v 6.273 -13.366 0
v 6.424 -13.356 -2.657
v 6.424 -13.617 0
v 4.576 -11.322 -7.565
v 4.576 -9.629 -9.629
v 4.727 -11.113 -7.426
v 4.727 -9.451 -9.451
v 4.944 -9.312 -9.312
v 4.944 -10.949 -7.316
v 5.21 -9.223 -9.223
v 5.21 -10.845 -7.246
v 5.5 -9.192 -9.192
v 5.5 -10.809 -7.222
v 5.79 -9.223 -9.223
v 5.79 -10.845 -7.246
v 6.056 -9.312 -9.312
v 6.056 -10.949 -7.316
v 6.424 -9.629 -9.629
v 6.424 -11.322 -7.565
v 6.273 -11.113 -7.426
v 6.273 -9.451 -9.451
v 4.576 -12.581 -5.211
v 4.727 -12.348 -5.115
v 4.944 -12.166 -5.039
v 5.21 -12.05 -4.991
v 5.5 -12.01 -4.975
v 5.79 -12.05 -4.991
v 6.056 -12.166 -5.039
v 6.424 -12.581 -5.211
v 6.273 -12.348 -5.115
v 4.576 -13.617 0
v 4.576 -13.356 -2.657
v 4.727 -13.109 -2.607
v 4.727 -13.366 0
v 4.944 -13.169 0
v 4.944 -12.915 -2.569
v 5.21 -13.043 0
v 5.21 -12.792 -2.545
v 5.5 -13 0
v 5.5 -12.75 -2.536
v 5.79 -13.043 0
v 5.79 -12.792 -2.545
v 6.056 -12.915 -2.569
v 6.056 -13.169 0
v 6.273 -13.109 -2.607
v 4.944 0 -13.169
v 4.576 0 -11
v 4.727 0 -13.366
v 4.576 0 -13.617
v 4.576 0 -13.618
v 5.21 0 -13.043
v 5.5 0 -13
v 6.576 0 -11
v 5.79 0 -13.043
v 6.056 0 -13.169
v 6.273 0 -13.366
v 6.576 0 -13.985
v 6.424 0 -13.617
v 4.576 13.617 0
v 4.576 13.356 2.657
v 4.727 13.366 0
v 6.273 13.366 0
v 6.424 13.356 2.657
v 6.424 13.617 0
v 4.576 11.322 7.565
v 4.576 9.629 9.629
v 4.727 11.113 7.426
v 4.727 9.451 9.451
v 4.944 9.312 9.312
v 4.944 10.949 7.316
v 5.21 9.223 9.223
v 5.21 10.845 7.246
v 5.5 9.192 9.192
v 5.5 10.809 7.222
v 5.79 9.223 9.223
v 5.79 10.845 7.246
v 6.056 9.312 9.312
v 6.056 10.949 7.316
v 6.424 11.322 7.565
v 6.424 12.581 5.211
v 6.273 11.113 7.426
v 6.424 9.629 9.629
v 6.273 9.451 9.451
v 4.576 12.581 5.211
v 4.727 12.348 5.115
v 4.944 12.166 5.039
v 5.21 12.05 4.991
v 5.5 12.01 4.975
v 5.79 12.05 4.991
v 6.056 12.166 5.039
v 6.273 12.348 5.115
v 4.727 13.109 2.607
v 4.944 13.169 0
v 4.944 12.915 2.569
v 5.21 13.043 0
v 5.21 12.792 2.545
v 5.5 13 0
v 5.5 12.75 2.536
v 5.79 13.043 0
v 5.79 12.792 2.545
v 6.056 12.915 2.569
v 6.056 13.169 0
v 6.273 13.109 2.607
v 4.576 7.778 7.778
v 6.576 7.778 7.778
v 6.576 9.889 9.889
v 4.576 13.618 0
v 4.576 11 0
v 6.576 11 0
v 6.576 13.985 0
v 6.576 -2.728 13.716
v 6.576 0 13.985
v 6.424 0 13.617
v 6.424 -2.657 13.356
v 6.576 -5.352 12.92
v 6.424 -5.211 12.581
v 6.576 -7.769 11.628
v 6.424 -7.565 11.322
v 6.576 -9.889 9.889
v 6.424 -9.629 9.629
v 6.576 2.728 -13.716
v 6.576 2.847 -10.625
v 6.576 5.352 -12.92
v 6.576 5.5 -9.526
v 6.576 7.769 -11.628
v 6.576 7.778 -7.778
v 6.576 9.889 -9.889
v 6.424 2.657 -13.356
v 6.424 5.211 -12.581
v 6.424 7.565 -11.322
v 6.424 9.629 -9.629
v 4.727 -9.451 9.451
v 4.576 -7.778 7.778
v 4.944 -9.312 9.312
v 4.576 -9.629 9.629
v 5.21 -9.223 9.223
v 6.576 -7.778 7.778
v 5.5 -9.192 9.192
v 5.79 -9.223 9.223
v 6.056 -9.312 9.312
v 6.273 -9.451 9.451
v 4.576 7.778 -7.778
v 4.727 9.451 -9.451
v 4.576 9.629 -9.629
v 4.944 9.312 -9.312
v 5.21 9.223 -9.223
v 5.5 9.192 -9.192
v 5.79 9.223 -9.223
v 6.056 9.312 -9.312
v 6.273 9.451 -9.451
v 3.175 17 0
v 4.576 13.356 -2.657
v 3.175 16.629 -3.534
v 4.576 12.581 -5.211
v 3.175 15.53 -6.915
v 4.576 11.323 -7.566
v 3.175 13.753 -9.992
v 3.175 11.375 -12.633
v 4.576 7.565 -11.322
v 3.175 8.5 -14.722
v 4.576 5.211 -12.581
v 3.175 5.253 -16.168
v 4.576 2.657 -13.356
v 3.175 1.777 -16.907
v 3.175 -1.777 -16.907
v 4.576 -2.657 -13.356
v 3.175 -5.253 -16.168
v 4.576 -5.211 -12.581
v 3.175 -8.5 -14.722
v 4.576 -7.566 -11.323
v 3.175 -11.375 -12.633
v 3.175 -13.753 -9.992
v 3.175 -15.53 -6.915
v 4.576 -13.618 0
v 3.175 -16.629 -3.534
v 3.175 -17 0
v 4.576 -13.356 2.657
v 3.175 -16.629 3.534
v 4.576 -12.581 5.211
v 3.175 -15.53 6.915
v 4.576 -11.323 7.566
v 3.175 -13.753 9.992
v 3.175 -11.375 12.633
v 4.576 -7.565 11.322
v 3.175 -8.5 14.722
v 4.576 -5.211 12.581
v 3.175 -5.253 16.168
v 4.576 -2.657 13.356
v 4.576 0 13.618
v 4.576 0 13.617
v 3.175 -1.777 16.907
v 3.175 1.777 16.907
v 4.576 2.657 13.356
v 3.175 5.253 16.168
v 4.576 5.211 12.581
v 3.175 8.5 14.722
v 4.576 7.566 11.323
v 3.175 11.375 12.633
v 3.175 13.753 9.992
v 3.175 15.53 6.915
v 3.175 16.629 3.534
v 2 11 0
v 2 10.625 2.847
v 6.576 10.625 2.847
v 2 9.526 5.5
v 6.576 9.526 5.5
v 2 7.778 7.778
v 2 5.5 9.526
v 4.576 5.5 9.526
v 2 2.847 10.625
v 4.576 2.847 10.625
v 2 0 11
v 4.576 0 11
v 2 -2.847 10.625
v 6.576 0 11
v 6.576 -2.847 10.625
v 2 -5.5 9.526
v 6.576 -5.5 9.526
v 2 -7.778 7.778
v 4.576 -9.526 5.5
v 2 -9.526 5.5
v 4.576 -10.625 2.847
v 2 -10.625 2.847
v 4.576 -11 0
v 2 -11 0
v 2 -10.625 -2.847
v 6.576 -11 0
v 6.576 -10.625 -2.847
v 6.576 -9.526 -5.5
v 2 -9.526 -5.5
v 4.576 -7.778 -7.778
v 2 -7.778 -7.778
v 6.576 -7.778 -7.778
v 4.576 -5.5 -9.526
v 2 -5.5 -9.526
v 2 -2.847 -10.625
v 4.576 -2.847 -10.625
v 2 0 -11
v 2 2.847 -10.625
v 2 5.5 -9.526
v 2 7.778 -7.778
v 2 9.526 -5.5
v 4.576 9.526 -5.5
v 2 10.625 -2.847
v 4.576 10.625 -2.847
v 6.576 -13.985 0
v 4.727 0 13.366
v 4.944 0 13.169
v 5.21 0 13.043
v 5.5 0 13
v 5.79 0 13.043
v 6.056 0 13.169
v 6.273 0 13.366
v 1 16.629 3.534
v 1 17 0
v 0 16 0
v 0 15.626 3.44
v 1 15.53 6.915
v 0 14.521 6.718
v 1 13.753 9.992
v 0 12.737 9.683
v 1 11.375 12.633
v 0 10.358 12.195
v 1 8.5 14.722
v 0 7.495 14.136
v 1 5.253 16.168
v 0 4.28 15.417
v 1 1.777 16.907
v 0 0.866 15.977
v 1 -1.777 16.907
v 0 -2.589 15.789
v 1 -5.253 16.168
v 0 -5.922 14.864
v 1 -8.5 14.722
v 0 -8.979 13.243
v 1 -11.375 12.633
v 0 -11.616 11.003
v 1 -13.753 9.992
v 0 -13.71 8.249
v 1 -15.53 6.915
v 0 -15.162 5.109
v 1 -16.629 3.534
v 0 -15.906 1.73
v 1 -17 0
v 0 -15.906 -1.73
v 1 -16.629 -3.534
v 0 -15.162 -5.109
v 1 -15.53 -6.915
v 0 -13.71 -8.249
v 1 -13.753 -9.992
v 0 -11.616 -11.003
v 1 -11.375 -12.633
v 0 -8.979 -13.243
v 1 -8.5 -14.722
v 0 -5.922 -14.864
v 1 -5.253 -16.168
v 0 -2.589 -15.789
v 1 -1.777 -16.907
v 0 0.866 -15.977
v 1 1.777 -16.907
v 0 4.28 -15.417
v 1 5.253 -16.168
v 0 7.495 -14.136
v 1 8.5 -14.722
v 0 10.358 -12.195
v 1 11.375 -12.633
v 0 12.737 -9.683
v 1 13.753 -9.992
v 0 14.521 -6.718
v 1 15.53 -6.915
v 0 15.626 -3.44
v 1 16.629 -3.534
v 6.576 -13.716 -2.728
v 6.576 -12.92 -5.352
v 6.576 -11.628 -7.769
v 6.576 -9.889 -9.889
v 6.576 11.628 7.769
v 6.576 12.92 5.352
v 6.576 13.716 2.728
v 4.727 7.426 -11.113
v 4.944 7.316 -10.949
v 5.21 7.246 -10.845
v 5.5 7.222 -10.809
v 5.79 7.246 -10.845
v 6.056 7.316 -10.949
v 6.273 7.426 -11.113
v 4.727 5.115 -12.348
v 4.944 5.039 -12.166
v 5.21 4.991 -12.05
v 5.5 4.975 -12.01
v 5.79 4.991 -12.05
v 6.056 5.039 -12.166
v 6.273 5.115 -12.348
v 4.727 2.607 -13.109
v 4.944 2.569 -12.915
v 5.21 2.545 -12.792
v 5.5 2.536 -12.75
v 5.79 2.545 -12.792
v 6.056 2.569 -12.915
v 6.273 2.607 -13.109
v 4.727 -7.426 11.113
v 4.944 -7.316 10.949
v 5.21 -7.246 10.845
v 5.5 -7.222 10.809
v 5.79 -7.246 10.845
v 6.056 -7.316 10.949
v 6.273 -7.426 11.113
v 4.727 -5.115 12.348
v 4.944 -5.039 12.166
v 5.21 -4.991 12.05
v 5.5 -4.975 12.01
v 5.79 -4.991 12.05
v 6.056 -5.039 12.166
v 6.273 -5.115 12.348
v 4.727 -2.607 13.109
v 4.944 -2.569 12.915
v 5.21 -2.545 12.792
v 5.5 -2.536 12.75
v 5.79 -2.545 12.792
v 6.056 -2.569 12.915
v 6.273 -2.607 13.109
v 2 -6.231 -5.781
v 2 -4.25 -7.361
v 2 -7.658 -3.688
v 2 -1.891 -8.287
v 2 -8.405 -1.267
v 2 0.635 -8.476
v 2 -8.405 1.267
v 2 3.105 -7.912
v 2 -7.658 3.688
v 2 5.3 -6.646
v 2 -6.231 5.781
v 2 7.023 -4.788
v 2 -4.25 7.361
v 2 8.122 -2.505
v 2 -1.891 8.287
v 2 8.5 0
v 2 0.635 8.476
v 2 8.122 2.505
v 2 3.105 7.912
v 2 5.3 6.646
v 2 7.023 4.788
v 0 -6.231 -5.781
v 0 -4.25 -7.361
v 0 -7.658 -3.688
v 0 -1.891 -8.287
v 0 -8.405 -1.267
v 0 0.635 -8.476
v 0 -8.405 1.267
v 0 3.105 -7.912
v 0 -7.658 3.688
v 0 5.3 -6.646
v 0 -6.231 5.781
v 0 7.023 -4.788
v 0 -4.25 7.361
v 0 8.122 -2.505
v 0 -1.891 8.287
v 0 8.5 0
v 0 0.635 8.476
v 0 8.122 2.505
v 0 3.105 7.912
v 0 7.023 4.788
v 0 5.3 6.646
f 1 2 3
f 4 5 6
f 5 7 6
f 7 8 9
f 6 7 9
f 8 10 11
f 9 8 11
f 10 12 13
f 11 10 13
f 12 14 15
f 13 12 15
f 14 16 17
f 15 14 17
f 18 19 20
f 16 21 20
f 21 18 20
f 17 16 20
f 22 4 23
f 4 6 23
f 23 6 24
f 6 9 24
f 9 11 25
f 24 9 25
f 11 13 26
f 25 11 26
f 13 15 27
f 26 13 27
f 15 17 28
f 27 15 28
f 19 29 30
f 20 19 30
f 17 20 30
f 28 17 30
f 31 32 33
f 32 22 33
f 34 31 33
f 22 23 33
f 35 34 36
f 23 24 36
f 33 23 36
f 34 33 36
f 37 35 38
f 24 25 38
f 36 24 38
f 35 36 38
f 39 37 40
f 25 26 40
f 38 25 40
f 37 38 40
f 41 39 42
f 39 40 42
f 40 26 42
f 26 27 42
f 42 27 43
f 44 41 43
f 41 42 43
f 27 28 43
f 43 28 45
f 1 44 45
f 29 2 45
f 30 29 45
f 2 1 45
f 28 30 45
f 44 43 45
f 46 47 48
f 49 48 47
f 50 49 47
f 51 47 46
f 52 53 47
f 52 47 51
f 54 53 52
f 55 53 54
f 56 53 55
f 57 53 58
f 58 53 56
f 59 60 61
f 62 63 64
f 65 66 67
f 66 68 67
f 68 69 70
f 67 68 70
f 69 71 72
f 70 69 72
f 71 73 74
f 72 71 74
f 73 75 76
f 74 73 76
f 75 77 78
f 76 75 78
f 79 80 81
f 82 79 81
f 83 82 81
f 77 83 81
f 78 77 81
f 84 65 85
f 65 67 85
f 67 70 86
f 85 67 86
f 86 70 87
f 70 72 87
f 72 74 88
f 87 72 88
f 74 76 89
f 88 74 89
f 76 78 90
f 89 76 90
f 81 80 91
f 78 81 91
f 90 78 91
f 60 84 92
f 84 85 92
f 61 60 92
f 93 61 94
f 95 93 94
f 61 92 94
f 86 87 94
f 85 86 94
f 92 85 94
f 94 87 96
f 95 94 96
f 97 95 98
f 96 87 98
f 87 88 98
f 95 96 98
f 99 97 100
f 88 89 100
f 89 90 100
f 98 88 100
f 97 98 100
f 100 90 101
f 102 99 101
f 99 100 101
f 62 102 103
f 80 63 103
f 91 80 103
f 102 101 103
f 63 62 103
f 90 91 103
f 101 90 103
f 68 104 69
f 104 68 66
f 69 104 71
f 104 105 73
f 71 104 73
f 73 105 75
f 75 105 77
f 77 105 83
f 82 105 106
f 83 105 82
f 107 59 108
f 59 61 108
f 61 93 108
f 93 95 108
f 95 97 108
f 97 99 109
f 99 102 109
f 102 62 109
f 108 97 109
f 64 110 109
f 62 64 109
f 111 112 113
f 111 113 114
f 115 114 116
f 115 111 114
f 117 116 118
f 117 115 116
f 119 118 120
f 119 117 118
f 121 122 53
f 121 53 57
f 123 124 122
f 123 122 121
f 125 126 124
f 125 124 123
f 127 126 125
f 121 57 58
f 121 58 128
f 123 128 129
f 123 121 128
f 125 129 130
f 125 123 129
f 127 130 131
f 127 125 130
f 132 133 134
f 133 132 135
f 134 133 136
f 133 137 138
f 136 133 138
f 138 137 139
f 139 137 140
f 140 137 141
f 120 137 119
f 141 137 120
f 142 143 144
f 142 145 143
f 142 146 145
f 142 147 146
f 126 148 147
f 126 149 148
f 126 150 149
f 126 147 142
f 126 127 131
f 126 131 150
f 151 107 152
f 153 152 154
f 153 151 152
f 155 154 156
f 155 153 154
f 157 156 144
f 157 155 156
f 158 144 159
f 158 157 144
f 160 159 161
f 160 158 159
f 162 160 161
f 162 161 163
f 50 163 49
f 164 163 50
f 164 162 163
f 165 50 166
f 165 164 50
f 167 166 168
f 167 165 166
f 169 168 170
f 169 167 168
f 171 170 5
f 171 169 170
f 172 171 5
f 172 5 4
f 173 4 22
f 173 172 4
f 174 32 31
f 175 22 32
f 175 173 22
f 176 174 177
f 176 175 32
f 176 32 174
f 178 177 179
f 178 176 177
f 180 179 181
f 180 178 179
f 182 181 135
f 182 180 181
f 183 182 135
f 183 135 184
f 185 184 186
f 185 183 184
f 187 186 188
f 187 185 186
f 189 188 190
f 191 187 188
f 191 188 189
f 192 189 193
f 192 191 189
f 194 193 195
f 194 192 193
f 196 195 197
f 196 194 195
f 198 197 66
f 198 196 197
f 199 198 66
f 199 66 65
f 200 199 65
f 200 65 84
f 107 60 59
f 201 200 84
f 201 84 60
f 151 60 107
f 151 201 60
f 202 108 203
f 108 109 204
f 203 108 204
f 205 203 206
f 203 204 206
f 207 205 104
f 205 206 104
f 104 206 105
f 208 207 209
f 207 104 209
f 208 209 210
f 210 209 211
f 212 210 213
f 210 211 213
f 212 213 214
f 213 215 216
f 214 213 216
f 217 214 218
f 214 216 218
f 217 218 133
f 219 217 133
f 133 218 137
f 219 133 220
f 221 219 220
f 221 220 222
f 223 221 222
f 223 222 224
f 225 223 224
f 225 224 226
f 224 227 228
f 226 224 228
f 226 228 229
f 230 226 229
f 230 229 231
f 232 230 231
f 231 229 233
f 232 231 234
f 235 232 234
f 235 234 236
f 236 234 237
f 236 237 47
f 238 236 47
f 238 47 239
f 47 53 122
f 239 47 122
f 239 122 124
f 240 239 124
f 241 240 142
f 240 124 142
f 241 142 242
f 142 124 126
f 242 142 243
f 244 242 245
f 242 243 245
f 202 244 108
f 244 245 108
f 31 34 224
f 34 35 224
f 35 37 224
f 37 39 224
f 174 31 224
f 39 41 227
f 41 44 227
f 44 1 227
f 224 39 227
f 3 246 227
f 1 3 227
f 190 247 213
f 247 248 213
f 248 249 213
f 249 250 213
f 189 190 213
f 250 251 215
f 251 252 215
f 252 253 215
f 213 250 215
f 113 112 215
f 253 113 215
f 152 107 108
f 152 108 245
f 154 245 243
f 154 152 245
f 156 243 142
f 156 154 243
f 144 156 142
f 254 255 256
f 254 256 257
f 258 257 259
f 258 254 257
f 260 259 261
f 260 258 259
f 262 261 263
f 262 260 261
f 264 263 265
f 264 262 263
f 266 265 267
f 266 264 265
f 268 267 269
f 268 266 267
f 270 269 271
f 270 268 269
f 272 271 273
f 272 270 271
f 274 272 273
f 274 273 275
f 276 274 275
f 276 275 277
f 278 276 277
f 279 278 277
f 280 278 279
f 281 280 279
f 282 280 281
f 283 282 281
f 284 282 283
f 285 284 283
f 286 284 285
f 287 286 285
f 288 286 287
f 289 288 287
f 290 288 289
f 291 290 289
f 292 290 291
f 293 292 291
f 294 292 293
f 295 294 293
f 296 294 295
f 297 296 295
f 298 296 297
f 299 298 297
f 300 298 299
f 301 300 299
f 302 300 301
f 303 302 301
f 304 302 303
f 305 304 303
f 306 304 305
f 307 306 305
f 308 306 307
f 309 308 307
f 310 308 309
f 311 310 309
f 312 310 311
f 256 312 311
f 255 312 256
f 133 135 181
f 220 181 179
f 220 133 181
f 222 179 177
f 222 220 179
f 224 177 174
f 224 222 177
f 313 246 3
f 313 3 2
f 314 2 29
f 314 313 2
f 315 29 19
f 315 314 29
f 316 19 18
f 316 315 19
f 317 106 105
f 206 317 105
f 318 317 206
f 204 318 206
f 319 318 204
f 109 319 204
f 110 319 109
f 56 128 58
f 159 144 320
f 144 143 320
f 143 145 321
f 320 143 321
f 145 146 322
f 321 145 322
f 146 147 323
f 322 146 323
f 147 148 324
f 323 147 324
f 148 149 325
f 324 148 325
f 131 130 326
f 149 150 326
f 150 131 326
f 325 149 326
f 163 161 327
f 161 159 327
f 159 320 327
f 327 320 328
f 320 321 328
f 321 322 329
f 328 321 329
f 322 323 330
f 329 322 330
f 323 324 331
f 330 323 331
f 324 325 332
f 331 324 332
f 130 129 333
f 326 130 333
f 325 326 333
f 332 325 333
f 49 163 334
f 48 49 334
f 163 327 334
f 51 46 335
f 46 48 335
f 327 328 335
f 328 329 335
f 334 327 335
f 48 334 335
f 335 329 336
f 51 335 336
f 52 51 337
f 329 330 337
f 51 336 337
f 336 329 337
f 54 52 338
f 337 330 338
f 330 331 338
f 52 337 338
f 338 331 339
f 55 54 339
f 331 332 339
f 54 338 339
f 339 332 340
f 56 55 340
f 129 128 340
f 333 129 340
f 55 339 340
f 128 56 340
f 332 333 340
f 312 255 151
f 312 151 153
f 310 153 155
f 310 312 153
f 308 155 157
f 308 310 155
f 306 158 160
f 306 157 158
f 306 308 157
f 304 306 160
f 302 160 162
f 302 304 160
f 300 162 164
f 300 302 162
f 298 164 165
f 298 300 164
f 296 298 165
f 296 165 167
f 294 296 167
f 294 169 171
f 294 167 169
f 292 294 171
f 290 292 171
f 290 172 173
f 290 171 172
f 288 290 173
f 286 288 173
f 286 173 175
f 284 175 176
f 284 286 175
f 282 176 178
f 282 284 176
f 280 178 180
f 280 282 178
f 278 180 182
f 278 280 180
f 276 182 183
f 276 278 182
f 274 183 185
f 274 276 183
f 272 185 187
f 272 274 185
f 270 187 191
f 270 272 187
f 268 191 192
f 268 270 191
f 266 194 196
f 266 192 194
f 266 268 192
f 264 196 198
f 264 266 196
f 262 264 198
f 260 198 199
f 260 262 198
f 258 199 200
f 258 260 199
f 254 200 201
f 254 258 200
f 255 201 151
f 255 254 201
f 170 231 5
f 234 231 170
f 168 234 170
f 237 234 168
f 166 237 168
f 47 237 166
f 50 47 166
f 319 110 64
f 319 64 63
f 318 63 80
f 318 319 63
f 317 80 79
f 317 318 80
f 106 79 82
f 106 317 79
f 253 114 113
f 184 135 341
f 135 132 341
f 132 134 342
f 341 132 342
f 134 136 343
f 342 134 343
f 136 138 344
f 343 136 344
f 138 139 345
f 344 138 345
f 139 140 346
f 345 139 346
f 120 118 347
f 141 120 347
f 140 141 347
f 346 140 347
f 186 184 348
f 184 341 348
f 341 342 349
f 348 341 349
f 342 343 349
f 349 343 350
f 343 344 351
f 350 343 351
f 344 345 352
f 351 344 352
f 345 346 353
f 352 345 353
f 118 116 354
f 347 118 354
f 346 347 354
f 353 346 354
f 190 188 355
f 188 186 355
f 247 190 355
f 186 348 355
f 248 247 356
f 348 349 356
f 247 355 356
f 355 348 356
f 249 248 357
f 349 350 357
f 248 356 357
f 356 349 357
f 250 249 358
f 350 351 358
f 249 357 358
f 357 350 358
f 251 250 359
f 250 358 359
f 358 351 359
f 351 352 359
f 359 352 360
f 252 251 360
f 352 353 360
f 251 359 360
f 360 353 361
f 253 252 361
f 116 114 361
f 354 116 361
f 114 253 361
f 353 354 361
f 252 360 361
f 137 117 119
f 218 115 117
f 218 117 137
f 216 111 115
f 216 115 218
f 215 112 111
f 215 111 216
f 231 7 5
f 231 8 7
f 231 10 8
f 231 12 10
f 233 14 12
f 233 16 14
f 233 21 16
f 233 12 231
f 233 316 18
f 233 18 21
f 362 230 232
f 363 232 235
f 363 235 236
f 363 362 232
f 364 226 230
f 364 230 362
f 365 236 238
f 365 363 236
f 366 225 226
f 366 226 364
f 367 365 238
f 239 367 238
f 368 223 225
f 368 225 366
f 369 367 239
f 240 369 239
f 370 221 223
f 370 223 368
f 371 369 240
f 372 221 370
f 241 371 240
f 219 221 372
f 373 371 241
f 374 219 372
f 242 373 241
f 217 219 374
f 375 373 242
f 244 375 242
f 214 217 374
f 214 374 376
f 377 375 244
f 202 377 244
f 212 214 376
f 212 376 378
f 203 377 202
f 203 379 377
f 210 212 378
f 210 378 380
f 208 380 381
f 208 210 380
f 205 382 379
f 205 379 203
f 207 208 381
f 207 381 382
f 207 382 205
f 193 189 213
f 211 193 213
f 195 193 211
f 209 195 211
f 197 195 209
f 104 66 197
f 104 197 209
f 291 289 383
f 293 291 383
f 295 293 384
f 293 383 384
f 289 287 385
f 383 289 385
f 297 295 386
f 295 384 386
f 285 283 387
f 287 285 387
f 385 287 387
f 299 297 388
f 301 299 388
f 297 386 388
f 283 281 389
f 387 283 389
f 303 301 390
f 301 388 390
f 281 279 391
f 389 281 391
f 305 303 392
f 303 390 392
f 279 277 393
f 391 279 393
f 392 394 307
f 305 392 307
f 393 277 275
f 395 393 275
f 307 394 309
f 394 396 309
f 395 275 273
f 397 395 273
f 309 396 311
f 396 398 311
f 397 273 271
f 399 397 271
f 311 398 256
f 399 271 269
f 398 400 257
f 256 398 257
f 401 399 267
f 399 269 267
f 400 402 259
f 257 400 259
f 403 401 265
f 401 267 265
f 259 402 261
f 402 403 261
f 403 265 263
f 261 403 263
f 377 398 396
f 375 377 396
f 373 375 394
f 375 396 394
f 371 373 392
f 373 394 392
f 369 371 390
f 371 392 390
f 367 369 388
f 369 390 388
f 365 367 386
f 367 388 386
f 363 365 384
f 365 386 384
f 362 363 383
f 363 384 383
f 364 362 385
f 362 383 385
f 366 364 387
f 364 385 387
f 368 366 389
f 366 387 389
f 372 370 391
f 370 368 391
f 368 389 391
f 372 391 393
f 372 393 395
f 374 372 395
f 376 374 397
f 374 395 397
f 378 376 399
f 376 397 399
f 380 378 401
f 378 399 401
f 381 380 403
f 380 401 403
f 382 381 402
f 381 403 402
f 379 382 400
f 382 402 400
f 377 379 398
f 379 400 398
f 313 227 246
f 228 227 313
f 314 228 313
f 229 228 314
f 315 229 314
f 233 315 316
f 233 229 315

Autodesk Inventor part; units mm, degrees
ref_plane "YZ Plane" through (0, 0, 0) normal (1, 0, 0) x (0, 1, 0)
ref_plane "XZ Plane" through (0, 0, 0) normal (0, 1, 0) x (-1, 0, 0)
ref_plane "XY Plane" through (0, 0, 0) normal (0, 0, 1) x (1, 0, 0)
sketch "Sketch1" plane through (0, 0, 0) normal (0, 0, 1) x (1, 0, 0)
  line L0 (3.175, 17) -> (4.5761, 13.6173)
  line L1 (6.4239, 13.6173) -> (7.825, 17)
  arc A0 (4.5761, 13.6173) -> (6.4239, 13.6173) centre (5.5, 14) ccw
  line L2 (7.825, 17) -> (9, 17)
  line L3 (3.175, 17) -> (0, 17)
  line L4 (2, 11) -> (9, 11)
  line L5 (9, 17) -> (9, 11)
  line L6 (0, 17) -> (0, 8.5)
  line L7 (2, 11) -> (2, 8.5)
  line L8 (2, 8.5) -> (0, 8.5)
  line L9 (0, 0) -> (2, 0) construction
  point P0 (5.5, 11)
  dimension "d0" = 45
  dimension "d1" = 1
  dimension "d2" = 3
  dimension "d4" = 6
  dimension "d5" = 2
  dimension "d8" = 7
  dimension "d9" = 17
  dimension "d10" = 22
revolve "Revolution1" add sketch "Sketch1" angle 360 about axis through (0, 0, 0) along (1, 0, 0)
sketch "Sketch2" plane through (9, 0, 0) normal (1, 0, 0) x (0, 0, -1)
  circle A0 centre (0, 0) radius 11 projected
  circle A1 centre (0, 0) radius 17 projected
  line L0 (-17, 0) -> (17, 0) construction
  line L1 (-12.0208, -12.0208) -> (12.0208, 12.0208) construction
  line L2 (0, -17) -> (0, 17) construction
  line L3 (12.0208, -12.0208) -> (-12.0208, 12.0208) construction
  line L4 (-17, 0) -> (-11, 0)
  line L5 (-7.7782, 7.7782) -> (-12.0208, 12.0208)
  line L6 (0, 17) -> (0, 11)
  line L7 (12.0208, 12.0208) -> (7.7782, 7.7782)
  line L8 (11, 0) -> (17, 0)
  line L9 (12.0208, -12.0208) -> (7.7782, -7.7782)
  line L10 (0, -17) -> (0, -11)
  line L11 (-7.7782, -7.7782) -> (-12.0208, -12.0208)
  arc A2 (7.7782, 7.7782) -> (0, 11) centre (0, 0) ccw
  arc A3 (12.0208, 12.0208) -> (0, 17) centre (0, 0) ccw
  arc A4 (7.7782, -7.7782) -> (11, 0) centre (0, 0) ccw
  arc A5 (12.0208, -12.0208) -> (17, 0) centre (0, 0) ccw
  arc A6 (-12.0208, 12.0208) -> (-17, 0) centre (0, 0) ccw
  arc A7 (-12.0208, -12.0208) -> (0, -17) centre (0, 0) ccw
  arc A8 (-7.7782, 7.7782) -> (-11, 0) centre (0, 0) ccw
  arc A9 (-7.7782, -7.7782) -> (0, -11) centre (0, 0) ccw
  dimension "d14" = 135
extrude "Extrusion1" cut sketch "Sketch2" against normal blind 4.424 contours L8 A1 L9 A0 | A0 L6 A1 L7 | L10 A1 L11 A0 | A0 L4 A1 L5
sketch "Sketch3" plane through (9, 0, 17) normal (1, 0, 0) x (0, 0, -1)
  line L0 (4.9792, -12.0208) -> (9.2218, -7.7782) projected
  arc A0 (6, 0) -> (9.2218, -7.7782) centre (17, 0) ccw projected
  line L1 (6, 0) -> (0, 0) projected
  arc A1 (0, 0) -> (4.9792, -12.0208) centre (17, 0) ccw projected
  line L2 (4.9792, 12.0208) -> (9.2218, 7.7782) projected
  arc A2 (17, 11) -> (9.2218, 7.7782) centre (17, 0) ccw projected
  line L3 (17, 11) -> (17, 17) projected
  arc A3 (17, 17) -> (4.9792, 12.0208) centre (17, 0) ccw projected
  line L4 (28, 0) -> (34, 0) projected
  arc A4 (34, 0) -> (29.0208, 12.0208) centre (17, 0) ccw projected
  line L5 (29.0208, 12.0208) -> (24.7782, 7.7782) projected
  arc A5 (28, 0) -> (24.7782, 7.7782) centre (17, 0) ccw projected
  line L6 (17, -11) -> (17, -17) projected
  arc A6 (17, -17) -> (29.0208, -12.0208) centre (17, 0) ccw projected
  line L7 (29.0208, -12.0208) -> (24.7782, -7.7782) projected
  arc A7 (17, -11) -> (24.7782, -7.7782) centre (17, 0) ccw projected
extrude "Extrusion2" cut sketch "Sketch3" against normal blind 2.424
chamfer "Chamfer1" distance 1 angle 45 1 edges at (0, -17, 0)
properties part number "rope_pulley" material "ABS Plastic"
